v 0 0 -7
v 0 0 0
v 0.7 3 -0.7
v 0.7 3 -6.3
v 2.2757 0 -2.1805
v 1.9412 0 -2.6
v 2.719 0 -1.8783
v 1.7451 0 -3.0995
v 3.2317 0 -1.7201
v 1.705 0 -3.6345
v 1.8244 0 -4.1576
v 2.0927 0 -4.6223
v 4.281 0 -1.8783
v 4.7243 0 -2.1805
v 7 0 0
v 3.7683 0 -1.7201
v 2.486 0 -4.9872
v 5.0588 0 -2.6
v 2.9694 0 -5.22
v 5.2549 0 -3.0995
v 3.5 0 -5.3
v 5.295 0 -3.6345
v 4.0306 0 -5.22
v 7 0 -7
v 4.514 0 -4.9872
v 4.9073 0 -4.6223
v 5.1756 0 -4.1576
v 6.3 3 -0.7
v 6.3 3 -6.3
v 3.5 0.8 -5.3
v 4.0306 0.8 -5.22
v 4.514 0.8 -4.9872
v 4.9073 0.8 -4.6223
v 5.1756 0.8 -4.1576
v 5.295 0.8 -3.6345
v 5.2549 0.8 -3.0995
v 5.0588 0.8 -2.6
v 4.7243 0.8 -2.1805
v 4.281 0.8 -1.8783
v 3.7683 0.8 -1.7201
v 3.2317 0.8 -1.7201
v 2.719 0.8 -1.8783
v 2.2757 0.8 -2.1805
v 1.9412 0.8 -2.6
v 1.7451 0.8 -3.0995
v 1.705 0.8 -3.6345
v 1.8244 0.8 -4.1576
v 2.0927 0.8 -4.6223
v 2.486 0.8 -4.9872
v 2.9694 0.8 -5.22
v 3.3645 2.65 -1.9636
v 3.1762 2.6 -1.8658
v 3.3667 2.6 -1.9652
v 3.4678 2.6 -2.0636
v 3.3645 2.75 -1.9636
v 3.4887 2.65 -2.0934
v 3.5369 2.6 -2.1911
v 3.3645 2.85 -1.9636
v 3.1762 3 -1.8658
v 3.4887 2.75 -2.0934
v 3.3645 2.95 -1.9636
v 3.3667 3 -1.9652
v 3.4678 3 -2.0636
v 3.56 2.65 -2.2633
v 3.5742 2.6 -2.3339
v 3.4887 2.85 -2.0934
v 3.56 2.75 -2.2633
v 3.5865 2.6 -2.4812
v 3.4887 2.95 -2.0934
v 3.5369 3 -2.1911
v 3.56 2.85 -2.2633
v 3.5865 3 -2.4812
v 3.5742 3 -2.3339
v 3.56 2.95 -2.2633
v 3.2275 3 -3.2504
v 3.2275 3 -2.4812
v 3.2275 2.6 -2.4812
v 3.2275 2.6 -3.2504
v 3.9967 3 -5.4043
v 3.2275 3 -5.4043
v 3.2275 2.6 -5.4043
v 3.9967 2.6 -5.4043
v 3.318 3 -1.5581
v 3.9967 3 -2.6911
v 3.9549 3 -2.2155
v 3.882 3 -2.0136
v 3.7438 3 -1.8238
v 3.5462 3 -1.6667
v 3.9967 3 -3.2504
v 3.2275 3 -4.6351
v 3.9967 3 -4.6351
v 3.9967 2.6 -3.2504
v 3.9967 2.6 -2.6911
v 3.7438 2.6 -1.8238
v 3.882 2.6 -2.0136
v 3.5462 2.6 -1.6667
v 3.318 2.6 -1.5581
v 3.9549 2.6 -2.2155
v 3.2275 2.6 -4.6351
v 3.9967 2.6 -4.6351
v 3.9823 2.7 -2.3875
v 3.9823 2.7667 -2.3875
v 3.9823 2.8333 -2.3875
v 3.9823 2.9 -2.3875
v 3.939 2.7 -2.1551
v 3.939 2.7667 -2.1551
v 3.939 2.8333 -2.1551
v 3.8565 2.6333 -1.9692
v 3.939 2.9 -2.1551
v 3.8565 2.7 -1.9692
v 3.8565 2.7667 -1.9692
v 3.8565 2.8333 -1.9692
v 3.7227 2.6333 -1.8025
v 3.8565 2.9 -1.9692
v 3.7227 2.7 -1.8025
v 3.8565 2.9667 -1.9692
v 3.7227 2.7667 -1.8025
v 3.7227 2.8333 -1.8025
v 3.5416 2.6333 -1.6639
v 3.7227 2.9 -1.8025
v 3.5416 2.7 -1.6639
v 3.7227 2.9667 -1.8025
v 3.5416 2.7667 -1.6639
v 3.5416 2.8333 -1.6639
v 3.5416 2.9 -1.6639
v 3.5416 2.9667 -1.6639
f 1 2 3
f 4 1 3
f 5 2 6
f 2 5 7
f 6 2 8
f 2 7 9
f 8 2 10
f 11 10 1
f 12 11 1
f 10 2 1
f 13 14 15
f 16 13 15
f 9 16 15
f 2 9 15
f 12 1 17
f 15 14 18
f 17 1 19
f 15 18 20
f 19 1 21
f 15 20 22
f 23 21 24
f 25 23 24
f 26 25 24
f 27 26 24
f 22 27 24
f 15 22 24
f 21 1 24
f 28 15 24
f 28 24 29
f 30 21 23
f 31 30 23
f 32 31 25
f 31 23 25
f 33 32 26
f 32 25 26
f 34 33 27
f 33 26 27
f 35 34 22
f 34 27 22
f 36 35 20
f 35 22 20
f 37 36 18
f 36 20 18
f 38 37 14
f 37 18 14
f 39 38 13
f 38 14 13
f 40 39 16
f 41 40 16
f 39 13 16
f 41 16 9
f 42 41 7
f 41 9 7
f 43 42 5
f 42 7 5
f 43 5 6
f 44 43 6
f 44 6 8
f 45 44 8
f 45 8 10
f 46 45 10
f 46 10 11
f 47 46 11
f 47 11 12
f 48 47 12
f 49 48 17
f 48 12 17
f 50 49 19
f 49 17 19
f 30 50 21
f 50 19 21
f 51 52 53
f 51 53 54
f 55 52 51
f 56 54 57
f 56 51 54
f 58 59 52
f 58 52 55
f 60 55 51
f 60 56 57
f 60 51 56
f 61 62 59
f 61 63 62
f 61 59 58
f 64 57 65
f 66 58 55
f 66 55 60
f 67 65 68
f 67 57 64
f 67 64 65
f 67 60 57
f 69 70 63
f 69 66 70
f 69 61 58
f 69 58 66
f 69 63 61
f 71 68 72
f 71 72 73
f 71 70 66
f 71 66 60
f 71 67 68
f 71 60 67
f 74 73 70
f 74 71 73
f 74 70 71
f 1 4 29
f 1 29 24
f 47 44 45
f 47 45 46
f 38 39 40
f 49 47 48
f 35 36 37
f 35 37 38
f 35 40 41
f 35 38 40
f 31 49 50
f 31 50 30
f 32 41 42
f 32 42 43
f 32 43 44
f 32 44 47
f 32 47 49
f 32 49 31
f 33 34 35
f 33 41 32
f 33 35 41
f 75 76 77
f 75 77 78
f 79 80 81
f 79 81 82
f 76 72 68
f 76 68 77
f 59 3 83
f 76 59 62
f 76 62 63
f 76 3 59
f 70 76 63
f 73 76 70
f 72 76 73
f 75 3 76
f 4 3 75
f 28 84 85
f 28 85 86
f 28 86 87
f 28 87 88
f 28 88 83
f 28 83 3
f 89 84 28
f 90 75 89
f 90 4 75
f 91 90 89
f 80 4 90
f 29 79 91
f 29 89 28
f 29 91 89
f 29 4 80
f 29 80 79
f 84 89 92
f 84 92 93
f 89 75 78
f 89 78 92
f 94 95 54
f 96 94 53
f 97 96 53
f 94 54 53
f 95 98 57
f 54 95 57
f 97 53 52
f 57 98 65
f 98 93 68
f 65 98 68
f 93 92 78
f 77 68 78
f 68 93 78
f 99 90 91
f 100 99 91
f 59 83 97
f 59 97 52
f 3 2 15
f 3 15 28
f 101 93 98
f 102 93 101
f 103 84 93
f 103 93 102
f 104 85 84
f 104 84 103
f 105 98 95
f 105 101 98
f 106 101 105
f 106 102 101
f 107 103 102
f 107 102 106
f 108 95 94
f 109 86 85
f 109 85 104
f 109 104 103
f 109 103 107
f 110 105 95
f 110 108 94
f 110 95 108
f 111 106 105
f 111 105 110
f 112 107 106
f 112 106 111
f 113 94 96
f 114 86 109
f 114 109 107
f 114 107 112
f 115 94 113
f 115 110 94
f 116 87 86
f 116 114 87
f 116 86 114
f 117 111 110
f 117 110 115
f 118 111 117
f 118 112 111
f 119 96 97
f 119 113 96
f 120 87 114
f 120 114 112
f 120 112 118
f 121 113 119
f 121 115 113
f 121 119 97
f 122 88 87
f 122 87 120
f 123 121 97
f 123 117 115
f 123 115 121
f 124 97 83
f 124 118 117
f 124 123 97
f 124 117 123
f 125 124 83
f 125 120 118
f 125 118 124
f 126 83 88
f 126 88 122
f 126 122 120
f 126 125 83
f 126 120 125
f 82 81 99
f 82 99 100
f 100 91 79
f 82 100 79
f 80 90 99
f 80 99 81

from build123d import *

# Parameters (mm, degrees)
SKETCH1_W           = 7
SKETCH1_H           = 7
BOSS_EXTRUDE1_DEPTH = 3
CUT_EXTRUDE1_DEPTH  = 7
CUT_EXTRUDE2_DEPTH  = 11
SKETCH4_R           = 1.8
CUT_EXTRUDE3_DEPTH  = 0.8
SKETCH5_W           = 0.769230769
SKETCH5_H           = 0.769230769
CUT_EXTRUDE4_DEPTH  = 0.4


with BuildPart() as part:
    # Sketch1 → Boss-Extrude1 (new body)
    with BuildSketch(Plane(origin=(0, 0, 0), x_dir=(1, 0, 0), z_dir=(0, 1, 0))):
        with Locations((3.5, 3.5)):
            Rectangle(SKETCH1_W, SKETCH1_H)
    extrude(amount=BOSS_EXTRUDE1_DEPTH)

    # Sketch2 → Cut-Extrude1 (cut)
    with BuildSketch(Plane.XY):
        Polygon((0, 0), (0.7, 3), (0, 3), align=None)
        Polygon((7, 0), (6.3, 3), (7, 3), align=None)
    extrude(amount=-CUT_EXTRUDE1_DEPTH, mode=Mode.SUBTRACT)

    # Sketch3 → Cut-Extrude2 (cut)
    with BuildSketch(Plane(origin=(0, 0, 0), x_dir=(0, 0, -1), z_dir=(1, 0, 0))):
        Polygon((0, 0), (0.7, 3), (0, 3), align=None)
        Polygon((7, 3), (6.3, 3), (7, 0), align=None)
    extrude(amount=CUT_EXTRUDE2_DEPTH, mode=Mode.SUBTRACT)

    # Sketch4 → Cut-Extrude3 (cut)
    with BuildSketch(Plane.XZ):
        with Locations(Location((3.5, -3.5, 0), (0, 0, 270))):
            Circle(SKETCH4_R)
    extrude(amount=-CUT_EXTRUDE3_DEPTH, mode=Mode.SUBTRACT)

    # Sketch5 → Cut-Extrude4 (cut)
    with BuildSketch(Plane(origin=(0, 3, 0), x_dir=(1, 0, 0), z_dir=(0, 1, 0))):
        with Locations((3.612093963, 5.019669427)):
            Rectangle(SKETCH5_W, SKETCH5_H)
        with BuildLine():
            Line((3.227478578, 3.250438657), (3.996709347, 3.250438657))
            Line((3.996709347, 3.250438657), (3.996709347, 2.691143785))
            add(Edge.make_bspline(
                [(3.996709347, 2.691143785), (3.996354449, 2.637428404), (3.995684356, 2.536006718), (3.983938379, 2.392937498), (3.967617452, 2.267298215), (3.941653281, 2.157473929), (3.906889784, 2.058293502), (3.857739809, 1.967540051), (3.797294746, 1.880692172), (3.723360469, 1.800377793), (3.638309276, 1.726095057), (3.541155635, 1.661498191), (3.434205152, 1.603945573), (3.357369532, 1.573646535), (3.31802345, 1.558130965)],
                knots=[0, 0, 0, 0, 1.347156832, 2.543608823, 3.599300285, 4.522475688, 5.370350604, 6.227678973, 7.103274953, 8.018757603, 8.959280198, 9.929437417, 10.939703653, 12, 12, 12, 12], degree=3))
            Line((3.31802345, 1.558130965), (3.176196527, 1.865823273))
            add(Edge.make_bspline(
                [(3.176196527, 1.865823273), (3.210545046, 1.879869864), (3.276215945, 1.906725527), (3.363744761, 1.959605892), (3.435078145, 2.021405192), (3.491618449, 2.092103782), (3.532319251, 2.173879945), (3.563358678, 2.265654966), (3.580969568, 2.369726497), (3.584571264, 2.442951924), (3.586452937, 2.481207888)],
                knots=[0, 0, 0, 0, 1.115416734, 2.132564161, 3.06091458, 3.941973359, 4.836922823, 5.794989041, 6.848011894, 8, 8, 8, 8], degree=3))
            Line((3.586452937, 2.481207888), (3.227478578, 2.481207888))
            Line((3.227478578, 2.481207888), (3.227478578, 3.250438657))
        make_face()
    extrude(amount=-CUT_EXTRUDE4_DEPTH, mode=Mode.SUBTRACT)


solid = part.part
